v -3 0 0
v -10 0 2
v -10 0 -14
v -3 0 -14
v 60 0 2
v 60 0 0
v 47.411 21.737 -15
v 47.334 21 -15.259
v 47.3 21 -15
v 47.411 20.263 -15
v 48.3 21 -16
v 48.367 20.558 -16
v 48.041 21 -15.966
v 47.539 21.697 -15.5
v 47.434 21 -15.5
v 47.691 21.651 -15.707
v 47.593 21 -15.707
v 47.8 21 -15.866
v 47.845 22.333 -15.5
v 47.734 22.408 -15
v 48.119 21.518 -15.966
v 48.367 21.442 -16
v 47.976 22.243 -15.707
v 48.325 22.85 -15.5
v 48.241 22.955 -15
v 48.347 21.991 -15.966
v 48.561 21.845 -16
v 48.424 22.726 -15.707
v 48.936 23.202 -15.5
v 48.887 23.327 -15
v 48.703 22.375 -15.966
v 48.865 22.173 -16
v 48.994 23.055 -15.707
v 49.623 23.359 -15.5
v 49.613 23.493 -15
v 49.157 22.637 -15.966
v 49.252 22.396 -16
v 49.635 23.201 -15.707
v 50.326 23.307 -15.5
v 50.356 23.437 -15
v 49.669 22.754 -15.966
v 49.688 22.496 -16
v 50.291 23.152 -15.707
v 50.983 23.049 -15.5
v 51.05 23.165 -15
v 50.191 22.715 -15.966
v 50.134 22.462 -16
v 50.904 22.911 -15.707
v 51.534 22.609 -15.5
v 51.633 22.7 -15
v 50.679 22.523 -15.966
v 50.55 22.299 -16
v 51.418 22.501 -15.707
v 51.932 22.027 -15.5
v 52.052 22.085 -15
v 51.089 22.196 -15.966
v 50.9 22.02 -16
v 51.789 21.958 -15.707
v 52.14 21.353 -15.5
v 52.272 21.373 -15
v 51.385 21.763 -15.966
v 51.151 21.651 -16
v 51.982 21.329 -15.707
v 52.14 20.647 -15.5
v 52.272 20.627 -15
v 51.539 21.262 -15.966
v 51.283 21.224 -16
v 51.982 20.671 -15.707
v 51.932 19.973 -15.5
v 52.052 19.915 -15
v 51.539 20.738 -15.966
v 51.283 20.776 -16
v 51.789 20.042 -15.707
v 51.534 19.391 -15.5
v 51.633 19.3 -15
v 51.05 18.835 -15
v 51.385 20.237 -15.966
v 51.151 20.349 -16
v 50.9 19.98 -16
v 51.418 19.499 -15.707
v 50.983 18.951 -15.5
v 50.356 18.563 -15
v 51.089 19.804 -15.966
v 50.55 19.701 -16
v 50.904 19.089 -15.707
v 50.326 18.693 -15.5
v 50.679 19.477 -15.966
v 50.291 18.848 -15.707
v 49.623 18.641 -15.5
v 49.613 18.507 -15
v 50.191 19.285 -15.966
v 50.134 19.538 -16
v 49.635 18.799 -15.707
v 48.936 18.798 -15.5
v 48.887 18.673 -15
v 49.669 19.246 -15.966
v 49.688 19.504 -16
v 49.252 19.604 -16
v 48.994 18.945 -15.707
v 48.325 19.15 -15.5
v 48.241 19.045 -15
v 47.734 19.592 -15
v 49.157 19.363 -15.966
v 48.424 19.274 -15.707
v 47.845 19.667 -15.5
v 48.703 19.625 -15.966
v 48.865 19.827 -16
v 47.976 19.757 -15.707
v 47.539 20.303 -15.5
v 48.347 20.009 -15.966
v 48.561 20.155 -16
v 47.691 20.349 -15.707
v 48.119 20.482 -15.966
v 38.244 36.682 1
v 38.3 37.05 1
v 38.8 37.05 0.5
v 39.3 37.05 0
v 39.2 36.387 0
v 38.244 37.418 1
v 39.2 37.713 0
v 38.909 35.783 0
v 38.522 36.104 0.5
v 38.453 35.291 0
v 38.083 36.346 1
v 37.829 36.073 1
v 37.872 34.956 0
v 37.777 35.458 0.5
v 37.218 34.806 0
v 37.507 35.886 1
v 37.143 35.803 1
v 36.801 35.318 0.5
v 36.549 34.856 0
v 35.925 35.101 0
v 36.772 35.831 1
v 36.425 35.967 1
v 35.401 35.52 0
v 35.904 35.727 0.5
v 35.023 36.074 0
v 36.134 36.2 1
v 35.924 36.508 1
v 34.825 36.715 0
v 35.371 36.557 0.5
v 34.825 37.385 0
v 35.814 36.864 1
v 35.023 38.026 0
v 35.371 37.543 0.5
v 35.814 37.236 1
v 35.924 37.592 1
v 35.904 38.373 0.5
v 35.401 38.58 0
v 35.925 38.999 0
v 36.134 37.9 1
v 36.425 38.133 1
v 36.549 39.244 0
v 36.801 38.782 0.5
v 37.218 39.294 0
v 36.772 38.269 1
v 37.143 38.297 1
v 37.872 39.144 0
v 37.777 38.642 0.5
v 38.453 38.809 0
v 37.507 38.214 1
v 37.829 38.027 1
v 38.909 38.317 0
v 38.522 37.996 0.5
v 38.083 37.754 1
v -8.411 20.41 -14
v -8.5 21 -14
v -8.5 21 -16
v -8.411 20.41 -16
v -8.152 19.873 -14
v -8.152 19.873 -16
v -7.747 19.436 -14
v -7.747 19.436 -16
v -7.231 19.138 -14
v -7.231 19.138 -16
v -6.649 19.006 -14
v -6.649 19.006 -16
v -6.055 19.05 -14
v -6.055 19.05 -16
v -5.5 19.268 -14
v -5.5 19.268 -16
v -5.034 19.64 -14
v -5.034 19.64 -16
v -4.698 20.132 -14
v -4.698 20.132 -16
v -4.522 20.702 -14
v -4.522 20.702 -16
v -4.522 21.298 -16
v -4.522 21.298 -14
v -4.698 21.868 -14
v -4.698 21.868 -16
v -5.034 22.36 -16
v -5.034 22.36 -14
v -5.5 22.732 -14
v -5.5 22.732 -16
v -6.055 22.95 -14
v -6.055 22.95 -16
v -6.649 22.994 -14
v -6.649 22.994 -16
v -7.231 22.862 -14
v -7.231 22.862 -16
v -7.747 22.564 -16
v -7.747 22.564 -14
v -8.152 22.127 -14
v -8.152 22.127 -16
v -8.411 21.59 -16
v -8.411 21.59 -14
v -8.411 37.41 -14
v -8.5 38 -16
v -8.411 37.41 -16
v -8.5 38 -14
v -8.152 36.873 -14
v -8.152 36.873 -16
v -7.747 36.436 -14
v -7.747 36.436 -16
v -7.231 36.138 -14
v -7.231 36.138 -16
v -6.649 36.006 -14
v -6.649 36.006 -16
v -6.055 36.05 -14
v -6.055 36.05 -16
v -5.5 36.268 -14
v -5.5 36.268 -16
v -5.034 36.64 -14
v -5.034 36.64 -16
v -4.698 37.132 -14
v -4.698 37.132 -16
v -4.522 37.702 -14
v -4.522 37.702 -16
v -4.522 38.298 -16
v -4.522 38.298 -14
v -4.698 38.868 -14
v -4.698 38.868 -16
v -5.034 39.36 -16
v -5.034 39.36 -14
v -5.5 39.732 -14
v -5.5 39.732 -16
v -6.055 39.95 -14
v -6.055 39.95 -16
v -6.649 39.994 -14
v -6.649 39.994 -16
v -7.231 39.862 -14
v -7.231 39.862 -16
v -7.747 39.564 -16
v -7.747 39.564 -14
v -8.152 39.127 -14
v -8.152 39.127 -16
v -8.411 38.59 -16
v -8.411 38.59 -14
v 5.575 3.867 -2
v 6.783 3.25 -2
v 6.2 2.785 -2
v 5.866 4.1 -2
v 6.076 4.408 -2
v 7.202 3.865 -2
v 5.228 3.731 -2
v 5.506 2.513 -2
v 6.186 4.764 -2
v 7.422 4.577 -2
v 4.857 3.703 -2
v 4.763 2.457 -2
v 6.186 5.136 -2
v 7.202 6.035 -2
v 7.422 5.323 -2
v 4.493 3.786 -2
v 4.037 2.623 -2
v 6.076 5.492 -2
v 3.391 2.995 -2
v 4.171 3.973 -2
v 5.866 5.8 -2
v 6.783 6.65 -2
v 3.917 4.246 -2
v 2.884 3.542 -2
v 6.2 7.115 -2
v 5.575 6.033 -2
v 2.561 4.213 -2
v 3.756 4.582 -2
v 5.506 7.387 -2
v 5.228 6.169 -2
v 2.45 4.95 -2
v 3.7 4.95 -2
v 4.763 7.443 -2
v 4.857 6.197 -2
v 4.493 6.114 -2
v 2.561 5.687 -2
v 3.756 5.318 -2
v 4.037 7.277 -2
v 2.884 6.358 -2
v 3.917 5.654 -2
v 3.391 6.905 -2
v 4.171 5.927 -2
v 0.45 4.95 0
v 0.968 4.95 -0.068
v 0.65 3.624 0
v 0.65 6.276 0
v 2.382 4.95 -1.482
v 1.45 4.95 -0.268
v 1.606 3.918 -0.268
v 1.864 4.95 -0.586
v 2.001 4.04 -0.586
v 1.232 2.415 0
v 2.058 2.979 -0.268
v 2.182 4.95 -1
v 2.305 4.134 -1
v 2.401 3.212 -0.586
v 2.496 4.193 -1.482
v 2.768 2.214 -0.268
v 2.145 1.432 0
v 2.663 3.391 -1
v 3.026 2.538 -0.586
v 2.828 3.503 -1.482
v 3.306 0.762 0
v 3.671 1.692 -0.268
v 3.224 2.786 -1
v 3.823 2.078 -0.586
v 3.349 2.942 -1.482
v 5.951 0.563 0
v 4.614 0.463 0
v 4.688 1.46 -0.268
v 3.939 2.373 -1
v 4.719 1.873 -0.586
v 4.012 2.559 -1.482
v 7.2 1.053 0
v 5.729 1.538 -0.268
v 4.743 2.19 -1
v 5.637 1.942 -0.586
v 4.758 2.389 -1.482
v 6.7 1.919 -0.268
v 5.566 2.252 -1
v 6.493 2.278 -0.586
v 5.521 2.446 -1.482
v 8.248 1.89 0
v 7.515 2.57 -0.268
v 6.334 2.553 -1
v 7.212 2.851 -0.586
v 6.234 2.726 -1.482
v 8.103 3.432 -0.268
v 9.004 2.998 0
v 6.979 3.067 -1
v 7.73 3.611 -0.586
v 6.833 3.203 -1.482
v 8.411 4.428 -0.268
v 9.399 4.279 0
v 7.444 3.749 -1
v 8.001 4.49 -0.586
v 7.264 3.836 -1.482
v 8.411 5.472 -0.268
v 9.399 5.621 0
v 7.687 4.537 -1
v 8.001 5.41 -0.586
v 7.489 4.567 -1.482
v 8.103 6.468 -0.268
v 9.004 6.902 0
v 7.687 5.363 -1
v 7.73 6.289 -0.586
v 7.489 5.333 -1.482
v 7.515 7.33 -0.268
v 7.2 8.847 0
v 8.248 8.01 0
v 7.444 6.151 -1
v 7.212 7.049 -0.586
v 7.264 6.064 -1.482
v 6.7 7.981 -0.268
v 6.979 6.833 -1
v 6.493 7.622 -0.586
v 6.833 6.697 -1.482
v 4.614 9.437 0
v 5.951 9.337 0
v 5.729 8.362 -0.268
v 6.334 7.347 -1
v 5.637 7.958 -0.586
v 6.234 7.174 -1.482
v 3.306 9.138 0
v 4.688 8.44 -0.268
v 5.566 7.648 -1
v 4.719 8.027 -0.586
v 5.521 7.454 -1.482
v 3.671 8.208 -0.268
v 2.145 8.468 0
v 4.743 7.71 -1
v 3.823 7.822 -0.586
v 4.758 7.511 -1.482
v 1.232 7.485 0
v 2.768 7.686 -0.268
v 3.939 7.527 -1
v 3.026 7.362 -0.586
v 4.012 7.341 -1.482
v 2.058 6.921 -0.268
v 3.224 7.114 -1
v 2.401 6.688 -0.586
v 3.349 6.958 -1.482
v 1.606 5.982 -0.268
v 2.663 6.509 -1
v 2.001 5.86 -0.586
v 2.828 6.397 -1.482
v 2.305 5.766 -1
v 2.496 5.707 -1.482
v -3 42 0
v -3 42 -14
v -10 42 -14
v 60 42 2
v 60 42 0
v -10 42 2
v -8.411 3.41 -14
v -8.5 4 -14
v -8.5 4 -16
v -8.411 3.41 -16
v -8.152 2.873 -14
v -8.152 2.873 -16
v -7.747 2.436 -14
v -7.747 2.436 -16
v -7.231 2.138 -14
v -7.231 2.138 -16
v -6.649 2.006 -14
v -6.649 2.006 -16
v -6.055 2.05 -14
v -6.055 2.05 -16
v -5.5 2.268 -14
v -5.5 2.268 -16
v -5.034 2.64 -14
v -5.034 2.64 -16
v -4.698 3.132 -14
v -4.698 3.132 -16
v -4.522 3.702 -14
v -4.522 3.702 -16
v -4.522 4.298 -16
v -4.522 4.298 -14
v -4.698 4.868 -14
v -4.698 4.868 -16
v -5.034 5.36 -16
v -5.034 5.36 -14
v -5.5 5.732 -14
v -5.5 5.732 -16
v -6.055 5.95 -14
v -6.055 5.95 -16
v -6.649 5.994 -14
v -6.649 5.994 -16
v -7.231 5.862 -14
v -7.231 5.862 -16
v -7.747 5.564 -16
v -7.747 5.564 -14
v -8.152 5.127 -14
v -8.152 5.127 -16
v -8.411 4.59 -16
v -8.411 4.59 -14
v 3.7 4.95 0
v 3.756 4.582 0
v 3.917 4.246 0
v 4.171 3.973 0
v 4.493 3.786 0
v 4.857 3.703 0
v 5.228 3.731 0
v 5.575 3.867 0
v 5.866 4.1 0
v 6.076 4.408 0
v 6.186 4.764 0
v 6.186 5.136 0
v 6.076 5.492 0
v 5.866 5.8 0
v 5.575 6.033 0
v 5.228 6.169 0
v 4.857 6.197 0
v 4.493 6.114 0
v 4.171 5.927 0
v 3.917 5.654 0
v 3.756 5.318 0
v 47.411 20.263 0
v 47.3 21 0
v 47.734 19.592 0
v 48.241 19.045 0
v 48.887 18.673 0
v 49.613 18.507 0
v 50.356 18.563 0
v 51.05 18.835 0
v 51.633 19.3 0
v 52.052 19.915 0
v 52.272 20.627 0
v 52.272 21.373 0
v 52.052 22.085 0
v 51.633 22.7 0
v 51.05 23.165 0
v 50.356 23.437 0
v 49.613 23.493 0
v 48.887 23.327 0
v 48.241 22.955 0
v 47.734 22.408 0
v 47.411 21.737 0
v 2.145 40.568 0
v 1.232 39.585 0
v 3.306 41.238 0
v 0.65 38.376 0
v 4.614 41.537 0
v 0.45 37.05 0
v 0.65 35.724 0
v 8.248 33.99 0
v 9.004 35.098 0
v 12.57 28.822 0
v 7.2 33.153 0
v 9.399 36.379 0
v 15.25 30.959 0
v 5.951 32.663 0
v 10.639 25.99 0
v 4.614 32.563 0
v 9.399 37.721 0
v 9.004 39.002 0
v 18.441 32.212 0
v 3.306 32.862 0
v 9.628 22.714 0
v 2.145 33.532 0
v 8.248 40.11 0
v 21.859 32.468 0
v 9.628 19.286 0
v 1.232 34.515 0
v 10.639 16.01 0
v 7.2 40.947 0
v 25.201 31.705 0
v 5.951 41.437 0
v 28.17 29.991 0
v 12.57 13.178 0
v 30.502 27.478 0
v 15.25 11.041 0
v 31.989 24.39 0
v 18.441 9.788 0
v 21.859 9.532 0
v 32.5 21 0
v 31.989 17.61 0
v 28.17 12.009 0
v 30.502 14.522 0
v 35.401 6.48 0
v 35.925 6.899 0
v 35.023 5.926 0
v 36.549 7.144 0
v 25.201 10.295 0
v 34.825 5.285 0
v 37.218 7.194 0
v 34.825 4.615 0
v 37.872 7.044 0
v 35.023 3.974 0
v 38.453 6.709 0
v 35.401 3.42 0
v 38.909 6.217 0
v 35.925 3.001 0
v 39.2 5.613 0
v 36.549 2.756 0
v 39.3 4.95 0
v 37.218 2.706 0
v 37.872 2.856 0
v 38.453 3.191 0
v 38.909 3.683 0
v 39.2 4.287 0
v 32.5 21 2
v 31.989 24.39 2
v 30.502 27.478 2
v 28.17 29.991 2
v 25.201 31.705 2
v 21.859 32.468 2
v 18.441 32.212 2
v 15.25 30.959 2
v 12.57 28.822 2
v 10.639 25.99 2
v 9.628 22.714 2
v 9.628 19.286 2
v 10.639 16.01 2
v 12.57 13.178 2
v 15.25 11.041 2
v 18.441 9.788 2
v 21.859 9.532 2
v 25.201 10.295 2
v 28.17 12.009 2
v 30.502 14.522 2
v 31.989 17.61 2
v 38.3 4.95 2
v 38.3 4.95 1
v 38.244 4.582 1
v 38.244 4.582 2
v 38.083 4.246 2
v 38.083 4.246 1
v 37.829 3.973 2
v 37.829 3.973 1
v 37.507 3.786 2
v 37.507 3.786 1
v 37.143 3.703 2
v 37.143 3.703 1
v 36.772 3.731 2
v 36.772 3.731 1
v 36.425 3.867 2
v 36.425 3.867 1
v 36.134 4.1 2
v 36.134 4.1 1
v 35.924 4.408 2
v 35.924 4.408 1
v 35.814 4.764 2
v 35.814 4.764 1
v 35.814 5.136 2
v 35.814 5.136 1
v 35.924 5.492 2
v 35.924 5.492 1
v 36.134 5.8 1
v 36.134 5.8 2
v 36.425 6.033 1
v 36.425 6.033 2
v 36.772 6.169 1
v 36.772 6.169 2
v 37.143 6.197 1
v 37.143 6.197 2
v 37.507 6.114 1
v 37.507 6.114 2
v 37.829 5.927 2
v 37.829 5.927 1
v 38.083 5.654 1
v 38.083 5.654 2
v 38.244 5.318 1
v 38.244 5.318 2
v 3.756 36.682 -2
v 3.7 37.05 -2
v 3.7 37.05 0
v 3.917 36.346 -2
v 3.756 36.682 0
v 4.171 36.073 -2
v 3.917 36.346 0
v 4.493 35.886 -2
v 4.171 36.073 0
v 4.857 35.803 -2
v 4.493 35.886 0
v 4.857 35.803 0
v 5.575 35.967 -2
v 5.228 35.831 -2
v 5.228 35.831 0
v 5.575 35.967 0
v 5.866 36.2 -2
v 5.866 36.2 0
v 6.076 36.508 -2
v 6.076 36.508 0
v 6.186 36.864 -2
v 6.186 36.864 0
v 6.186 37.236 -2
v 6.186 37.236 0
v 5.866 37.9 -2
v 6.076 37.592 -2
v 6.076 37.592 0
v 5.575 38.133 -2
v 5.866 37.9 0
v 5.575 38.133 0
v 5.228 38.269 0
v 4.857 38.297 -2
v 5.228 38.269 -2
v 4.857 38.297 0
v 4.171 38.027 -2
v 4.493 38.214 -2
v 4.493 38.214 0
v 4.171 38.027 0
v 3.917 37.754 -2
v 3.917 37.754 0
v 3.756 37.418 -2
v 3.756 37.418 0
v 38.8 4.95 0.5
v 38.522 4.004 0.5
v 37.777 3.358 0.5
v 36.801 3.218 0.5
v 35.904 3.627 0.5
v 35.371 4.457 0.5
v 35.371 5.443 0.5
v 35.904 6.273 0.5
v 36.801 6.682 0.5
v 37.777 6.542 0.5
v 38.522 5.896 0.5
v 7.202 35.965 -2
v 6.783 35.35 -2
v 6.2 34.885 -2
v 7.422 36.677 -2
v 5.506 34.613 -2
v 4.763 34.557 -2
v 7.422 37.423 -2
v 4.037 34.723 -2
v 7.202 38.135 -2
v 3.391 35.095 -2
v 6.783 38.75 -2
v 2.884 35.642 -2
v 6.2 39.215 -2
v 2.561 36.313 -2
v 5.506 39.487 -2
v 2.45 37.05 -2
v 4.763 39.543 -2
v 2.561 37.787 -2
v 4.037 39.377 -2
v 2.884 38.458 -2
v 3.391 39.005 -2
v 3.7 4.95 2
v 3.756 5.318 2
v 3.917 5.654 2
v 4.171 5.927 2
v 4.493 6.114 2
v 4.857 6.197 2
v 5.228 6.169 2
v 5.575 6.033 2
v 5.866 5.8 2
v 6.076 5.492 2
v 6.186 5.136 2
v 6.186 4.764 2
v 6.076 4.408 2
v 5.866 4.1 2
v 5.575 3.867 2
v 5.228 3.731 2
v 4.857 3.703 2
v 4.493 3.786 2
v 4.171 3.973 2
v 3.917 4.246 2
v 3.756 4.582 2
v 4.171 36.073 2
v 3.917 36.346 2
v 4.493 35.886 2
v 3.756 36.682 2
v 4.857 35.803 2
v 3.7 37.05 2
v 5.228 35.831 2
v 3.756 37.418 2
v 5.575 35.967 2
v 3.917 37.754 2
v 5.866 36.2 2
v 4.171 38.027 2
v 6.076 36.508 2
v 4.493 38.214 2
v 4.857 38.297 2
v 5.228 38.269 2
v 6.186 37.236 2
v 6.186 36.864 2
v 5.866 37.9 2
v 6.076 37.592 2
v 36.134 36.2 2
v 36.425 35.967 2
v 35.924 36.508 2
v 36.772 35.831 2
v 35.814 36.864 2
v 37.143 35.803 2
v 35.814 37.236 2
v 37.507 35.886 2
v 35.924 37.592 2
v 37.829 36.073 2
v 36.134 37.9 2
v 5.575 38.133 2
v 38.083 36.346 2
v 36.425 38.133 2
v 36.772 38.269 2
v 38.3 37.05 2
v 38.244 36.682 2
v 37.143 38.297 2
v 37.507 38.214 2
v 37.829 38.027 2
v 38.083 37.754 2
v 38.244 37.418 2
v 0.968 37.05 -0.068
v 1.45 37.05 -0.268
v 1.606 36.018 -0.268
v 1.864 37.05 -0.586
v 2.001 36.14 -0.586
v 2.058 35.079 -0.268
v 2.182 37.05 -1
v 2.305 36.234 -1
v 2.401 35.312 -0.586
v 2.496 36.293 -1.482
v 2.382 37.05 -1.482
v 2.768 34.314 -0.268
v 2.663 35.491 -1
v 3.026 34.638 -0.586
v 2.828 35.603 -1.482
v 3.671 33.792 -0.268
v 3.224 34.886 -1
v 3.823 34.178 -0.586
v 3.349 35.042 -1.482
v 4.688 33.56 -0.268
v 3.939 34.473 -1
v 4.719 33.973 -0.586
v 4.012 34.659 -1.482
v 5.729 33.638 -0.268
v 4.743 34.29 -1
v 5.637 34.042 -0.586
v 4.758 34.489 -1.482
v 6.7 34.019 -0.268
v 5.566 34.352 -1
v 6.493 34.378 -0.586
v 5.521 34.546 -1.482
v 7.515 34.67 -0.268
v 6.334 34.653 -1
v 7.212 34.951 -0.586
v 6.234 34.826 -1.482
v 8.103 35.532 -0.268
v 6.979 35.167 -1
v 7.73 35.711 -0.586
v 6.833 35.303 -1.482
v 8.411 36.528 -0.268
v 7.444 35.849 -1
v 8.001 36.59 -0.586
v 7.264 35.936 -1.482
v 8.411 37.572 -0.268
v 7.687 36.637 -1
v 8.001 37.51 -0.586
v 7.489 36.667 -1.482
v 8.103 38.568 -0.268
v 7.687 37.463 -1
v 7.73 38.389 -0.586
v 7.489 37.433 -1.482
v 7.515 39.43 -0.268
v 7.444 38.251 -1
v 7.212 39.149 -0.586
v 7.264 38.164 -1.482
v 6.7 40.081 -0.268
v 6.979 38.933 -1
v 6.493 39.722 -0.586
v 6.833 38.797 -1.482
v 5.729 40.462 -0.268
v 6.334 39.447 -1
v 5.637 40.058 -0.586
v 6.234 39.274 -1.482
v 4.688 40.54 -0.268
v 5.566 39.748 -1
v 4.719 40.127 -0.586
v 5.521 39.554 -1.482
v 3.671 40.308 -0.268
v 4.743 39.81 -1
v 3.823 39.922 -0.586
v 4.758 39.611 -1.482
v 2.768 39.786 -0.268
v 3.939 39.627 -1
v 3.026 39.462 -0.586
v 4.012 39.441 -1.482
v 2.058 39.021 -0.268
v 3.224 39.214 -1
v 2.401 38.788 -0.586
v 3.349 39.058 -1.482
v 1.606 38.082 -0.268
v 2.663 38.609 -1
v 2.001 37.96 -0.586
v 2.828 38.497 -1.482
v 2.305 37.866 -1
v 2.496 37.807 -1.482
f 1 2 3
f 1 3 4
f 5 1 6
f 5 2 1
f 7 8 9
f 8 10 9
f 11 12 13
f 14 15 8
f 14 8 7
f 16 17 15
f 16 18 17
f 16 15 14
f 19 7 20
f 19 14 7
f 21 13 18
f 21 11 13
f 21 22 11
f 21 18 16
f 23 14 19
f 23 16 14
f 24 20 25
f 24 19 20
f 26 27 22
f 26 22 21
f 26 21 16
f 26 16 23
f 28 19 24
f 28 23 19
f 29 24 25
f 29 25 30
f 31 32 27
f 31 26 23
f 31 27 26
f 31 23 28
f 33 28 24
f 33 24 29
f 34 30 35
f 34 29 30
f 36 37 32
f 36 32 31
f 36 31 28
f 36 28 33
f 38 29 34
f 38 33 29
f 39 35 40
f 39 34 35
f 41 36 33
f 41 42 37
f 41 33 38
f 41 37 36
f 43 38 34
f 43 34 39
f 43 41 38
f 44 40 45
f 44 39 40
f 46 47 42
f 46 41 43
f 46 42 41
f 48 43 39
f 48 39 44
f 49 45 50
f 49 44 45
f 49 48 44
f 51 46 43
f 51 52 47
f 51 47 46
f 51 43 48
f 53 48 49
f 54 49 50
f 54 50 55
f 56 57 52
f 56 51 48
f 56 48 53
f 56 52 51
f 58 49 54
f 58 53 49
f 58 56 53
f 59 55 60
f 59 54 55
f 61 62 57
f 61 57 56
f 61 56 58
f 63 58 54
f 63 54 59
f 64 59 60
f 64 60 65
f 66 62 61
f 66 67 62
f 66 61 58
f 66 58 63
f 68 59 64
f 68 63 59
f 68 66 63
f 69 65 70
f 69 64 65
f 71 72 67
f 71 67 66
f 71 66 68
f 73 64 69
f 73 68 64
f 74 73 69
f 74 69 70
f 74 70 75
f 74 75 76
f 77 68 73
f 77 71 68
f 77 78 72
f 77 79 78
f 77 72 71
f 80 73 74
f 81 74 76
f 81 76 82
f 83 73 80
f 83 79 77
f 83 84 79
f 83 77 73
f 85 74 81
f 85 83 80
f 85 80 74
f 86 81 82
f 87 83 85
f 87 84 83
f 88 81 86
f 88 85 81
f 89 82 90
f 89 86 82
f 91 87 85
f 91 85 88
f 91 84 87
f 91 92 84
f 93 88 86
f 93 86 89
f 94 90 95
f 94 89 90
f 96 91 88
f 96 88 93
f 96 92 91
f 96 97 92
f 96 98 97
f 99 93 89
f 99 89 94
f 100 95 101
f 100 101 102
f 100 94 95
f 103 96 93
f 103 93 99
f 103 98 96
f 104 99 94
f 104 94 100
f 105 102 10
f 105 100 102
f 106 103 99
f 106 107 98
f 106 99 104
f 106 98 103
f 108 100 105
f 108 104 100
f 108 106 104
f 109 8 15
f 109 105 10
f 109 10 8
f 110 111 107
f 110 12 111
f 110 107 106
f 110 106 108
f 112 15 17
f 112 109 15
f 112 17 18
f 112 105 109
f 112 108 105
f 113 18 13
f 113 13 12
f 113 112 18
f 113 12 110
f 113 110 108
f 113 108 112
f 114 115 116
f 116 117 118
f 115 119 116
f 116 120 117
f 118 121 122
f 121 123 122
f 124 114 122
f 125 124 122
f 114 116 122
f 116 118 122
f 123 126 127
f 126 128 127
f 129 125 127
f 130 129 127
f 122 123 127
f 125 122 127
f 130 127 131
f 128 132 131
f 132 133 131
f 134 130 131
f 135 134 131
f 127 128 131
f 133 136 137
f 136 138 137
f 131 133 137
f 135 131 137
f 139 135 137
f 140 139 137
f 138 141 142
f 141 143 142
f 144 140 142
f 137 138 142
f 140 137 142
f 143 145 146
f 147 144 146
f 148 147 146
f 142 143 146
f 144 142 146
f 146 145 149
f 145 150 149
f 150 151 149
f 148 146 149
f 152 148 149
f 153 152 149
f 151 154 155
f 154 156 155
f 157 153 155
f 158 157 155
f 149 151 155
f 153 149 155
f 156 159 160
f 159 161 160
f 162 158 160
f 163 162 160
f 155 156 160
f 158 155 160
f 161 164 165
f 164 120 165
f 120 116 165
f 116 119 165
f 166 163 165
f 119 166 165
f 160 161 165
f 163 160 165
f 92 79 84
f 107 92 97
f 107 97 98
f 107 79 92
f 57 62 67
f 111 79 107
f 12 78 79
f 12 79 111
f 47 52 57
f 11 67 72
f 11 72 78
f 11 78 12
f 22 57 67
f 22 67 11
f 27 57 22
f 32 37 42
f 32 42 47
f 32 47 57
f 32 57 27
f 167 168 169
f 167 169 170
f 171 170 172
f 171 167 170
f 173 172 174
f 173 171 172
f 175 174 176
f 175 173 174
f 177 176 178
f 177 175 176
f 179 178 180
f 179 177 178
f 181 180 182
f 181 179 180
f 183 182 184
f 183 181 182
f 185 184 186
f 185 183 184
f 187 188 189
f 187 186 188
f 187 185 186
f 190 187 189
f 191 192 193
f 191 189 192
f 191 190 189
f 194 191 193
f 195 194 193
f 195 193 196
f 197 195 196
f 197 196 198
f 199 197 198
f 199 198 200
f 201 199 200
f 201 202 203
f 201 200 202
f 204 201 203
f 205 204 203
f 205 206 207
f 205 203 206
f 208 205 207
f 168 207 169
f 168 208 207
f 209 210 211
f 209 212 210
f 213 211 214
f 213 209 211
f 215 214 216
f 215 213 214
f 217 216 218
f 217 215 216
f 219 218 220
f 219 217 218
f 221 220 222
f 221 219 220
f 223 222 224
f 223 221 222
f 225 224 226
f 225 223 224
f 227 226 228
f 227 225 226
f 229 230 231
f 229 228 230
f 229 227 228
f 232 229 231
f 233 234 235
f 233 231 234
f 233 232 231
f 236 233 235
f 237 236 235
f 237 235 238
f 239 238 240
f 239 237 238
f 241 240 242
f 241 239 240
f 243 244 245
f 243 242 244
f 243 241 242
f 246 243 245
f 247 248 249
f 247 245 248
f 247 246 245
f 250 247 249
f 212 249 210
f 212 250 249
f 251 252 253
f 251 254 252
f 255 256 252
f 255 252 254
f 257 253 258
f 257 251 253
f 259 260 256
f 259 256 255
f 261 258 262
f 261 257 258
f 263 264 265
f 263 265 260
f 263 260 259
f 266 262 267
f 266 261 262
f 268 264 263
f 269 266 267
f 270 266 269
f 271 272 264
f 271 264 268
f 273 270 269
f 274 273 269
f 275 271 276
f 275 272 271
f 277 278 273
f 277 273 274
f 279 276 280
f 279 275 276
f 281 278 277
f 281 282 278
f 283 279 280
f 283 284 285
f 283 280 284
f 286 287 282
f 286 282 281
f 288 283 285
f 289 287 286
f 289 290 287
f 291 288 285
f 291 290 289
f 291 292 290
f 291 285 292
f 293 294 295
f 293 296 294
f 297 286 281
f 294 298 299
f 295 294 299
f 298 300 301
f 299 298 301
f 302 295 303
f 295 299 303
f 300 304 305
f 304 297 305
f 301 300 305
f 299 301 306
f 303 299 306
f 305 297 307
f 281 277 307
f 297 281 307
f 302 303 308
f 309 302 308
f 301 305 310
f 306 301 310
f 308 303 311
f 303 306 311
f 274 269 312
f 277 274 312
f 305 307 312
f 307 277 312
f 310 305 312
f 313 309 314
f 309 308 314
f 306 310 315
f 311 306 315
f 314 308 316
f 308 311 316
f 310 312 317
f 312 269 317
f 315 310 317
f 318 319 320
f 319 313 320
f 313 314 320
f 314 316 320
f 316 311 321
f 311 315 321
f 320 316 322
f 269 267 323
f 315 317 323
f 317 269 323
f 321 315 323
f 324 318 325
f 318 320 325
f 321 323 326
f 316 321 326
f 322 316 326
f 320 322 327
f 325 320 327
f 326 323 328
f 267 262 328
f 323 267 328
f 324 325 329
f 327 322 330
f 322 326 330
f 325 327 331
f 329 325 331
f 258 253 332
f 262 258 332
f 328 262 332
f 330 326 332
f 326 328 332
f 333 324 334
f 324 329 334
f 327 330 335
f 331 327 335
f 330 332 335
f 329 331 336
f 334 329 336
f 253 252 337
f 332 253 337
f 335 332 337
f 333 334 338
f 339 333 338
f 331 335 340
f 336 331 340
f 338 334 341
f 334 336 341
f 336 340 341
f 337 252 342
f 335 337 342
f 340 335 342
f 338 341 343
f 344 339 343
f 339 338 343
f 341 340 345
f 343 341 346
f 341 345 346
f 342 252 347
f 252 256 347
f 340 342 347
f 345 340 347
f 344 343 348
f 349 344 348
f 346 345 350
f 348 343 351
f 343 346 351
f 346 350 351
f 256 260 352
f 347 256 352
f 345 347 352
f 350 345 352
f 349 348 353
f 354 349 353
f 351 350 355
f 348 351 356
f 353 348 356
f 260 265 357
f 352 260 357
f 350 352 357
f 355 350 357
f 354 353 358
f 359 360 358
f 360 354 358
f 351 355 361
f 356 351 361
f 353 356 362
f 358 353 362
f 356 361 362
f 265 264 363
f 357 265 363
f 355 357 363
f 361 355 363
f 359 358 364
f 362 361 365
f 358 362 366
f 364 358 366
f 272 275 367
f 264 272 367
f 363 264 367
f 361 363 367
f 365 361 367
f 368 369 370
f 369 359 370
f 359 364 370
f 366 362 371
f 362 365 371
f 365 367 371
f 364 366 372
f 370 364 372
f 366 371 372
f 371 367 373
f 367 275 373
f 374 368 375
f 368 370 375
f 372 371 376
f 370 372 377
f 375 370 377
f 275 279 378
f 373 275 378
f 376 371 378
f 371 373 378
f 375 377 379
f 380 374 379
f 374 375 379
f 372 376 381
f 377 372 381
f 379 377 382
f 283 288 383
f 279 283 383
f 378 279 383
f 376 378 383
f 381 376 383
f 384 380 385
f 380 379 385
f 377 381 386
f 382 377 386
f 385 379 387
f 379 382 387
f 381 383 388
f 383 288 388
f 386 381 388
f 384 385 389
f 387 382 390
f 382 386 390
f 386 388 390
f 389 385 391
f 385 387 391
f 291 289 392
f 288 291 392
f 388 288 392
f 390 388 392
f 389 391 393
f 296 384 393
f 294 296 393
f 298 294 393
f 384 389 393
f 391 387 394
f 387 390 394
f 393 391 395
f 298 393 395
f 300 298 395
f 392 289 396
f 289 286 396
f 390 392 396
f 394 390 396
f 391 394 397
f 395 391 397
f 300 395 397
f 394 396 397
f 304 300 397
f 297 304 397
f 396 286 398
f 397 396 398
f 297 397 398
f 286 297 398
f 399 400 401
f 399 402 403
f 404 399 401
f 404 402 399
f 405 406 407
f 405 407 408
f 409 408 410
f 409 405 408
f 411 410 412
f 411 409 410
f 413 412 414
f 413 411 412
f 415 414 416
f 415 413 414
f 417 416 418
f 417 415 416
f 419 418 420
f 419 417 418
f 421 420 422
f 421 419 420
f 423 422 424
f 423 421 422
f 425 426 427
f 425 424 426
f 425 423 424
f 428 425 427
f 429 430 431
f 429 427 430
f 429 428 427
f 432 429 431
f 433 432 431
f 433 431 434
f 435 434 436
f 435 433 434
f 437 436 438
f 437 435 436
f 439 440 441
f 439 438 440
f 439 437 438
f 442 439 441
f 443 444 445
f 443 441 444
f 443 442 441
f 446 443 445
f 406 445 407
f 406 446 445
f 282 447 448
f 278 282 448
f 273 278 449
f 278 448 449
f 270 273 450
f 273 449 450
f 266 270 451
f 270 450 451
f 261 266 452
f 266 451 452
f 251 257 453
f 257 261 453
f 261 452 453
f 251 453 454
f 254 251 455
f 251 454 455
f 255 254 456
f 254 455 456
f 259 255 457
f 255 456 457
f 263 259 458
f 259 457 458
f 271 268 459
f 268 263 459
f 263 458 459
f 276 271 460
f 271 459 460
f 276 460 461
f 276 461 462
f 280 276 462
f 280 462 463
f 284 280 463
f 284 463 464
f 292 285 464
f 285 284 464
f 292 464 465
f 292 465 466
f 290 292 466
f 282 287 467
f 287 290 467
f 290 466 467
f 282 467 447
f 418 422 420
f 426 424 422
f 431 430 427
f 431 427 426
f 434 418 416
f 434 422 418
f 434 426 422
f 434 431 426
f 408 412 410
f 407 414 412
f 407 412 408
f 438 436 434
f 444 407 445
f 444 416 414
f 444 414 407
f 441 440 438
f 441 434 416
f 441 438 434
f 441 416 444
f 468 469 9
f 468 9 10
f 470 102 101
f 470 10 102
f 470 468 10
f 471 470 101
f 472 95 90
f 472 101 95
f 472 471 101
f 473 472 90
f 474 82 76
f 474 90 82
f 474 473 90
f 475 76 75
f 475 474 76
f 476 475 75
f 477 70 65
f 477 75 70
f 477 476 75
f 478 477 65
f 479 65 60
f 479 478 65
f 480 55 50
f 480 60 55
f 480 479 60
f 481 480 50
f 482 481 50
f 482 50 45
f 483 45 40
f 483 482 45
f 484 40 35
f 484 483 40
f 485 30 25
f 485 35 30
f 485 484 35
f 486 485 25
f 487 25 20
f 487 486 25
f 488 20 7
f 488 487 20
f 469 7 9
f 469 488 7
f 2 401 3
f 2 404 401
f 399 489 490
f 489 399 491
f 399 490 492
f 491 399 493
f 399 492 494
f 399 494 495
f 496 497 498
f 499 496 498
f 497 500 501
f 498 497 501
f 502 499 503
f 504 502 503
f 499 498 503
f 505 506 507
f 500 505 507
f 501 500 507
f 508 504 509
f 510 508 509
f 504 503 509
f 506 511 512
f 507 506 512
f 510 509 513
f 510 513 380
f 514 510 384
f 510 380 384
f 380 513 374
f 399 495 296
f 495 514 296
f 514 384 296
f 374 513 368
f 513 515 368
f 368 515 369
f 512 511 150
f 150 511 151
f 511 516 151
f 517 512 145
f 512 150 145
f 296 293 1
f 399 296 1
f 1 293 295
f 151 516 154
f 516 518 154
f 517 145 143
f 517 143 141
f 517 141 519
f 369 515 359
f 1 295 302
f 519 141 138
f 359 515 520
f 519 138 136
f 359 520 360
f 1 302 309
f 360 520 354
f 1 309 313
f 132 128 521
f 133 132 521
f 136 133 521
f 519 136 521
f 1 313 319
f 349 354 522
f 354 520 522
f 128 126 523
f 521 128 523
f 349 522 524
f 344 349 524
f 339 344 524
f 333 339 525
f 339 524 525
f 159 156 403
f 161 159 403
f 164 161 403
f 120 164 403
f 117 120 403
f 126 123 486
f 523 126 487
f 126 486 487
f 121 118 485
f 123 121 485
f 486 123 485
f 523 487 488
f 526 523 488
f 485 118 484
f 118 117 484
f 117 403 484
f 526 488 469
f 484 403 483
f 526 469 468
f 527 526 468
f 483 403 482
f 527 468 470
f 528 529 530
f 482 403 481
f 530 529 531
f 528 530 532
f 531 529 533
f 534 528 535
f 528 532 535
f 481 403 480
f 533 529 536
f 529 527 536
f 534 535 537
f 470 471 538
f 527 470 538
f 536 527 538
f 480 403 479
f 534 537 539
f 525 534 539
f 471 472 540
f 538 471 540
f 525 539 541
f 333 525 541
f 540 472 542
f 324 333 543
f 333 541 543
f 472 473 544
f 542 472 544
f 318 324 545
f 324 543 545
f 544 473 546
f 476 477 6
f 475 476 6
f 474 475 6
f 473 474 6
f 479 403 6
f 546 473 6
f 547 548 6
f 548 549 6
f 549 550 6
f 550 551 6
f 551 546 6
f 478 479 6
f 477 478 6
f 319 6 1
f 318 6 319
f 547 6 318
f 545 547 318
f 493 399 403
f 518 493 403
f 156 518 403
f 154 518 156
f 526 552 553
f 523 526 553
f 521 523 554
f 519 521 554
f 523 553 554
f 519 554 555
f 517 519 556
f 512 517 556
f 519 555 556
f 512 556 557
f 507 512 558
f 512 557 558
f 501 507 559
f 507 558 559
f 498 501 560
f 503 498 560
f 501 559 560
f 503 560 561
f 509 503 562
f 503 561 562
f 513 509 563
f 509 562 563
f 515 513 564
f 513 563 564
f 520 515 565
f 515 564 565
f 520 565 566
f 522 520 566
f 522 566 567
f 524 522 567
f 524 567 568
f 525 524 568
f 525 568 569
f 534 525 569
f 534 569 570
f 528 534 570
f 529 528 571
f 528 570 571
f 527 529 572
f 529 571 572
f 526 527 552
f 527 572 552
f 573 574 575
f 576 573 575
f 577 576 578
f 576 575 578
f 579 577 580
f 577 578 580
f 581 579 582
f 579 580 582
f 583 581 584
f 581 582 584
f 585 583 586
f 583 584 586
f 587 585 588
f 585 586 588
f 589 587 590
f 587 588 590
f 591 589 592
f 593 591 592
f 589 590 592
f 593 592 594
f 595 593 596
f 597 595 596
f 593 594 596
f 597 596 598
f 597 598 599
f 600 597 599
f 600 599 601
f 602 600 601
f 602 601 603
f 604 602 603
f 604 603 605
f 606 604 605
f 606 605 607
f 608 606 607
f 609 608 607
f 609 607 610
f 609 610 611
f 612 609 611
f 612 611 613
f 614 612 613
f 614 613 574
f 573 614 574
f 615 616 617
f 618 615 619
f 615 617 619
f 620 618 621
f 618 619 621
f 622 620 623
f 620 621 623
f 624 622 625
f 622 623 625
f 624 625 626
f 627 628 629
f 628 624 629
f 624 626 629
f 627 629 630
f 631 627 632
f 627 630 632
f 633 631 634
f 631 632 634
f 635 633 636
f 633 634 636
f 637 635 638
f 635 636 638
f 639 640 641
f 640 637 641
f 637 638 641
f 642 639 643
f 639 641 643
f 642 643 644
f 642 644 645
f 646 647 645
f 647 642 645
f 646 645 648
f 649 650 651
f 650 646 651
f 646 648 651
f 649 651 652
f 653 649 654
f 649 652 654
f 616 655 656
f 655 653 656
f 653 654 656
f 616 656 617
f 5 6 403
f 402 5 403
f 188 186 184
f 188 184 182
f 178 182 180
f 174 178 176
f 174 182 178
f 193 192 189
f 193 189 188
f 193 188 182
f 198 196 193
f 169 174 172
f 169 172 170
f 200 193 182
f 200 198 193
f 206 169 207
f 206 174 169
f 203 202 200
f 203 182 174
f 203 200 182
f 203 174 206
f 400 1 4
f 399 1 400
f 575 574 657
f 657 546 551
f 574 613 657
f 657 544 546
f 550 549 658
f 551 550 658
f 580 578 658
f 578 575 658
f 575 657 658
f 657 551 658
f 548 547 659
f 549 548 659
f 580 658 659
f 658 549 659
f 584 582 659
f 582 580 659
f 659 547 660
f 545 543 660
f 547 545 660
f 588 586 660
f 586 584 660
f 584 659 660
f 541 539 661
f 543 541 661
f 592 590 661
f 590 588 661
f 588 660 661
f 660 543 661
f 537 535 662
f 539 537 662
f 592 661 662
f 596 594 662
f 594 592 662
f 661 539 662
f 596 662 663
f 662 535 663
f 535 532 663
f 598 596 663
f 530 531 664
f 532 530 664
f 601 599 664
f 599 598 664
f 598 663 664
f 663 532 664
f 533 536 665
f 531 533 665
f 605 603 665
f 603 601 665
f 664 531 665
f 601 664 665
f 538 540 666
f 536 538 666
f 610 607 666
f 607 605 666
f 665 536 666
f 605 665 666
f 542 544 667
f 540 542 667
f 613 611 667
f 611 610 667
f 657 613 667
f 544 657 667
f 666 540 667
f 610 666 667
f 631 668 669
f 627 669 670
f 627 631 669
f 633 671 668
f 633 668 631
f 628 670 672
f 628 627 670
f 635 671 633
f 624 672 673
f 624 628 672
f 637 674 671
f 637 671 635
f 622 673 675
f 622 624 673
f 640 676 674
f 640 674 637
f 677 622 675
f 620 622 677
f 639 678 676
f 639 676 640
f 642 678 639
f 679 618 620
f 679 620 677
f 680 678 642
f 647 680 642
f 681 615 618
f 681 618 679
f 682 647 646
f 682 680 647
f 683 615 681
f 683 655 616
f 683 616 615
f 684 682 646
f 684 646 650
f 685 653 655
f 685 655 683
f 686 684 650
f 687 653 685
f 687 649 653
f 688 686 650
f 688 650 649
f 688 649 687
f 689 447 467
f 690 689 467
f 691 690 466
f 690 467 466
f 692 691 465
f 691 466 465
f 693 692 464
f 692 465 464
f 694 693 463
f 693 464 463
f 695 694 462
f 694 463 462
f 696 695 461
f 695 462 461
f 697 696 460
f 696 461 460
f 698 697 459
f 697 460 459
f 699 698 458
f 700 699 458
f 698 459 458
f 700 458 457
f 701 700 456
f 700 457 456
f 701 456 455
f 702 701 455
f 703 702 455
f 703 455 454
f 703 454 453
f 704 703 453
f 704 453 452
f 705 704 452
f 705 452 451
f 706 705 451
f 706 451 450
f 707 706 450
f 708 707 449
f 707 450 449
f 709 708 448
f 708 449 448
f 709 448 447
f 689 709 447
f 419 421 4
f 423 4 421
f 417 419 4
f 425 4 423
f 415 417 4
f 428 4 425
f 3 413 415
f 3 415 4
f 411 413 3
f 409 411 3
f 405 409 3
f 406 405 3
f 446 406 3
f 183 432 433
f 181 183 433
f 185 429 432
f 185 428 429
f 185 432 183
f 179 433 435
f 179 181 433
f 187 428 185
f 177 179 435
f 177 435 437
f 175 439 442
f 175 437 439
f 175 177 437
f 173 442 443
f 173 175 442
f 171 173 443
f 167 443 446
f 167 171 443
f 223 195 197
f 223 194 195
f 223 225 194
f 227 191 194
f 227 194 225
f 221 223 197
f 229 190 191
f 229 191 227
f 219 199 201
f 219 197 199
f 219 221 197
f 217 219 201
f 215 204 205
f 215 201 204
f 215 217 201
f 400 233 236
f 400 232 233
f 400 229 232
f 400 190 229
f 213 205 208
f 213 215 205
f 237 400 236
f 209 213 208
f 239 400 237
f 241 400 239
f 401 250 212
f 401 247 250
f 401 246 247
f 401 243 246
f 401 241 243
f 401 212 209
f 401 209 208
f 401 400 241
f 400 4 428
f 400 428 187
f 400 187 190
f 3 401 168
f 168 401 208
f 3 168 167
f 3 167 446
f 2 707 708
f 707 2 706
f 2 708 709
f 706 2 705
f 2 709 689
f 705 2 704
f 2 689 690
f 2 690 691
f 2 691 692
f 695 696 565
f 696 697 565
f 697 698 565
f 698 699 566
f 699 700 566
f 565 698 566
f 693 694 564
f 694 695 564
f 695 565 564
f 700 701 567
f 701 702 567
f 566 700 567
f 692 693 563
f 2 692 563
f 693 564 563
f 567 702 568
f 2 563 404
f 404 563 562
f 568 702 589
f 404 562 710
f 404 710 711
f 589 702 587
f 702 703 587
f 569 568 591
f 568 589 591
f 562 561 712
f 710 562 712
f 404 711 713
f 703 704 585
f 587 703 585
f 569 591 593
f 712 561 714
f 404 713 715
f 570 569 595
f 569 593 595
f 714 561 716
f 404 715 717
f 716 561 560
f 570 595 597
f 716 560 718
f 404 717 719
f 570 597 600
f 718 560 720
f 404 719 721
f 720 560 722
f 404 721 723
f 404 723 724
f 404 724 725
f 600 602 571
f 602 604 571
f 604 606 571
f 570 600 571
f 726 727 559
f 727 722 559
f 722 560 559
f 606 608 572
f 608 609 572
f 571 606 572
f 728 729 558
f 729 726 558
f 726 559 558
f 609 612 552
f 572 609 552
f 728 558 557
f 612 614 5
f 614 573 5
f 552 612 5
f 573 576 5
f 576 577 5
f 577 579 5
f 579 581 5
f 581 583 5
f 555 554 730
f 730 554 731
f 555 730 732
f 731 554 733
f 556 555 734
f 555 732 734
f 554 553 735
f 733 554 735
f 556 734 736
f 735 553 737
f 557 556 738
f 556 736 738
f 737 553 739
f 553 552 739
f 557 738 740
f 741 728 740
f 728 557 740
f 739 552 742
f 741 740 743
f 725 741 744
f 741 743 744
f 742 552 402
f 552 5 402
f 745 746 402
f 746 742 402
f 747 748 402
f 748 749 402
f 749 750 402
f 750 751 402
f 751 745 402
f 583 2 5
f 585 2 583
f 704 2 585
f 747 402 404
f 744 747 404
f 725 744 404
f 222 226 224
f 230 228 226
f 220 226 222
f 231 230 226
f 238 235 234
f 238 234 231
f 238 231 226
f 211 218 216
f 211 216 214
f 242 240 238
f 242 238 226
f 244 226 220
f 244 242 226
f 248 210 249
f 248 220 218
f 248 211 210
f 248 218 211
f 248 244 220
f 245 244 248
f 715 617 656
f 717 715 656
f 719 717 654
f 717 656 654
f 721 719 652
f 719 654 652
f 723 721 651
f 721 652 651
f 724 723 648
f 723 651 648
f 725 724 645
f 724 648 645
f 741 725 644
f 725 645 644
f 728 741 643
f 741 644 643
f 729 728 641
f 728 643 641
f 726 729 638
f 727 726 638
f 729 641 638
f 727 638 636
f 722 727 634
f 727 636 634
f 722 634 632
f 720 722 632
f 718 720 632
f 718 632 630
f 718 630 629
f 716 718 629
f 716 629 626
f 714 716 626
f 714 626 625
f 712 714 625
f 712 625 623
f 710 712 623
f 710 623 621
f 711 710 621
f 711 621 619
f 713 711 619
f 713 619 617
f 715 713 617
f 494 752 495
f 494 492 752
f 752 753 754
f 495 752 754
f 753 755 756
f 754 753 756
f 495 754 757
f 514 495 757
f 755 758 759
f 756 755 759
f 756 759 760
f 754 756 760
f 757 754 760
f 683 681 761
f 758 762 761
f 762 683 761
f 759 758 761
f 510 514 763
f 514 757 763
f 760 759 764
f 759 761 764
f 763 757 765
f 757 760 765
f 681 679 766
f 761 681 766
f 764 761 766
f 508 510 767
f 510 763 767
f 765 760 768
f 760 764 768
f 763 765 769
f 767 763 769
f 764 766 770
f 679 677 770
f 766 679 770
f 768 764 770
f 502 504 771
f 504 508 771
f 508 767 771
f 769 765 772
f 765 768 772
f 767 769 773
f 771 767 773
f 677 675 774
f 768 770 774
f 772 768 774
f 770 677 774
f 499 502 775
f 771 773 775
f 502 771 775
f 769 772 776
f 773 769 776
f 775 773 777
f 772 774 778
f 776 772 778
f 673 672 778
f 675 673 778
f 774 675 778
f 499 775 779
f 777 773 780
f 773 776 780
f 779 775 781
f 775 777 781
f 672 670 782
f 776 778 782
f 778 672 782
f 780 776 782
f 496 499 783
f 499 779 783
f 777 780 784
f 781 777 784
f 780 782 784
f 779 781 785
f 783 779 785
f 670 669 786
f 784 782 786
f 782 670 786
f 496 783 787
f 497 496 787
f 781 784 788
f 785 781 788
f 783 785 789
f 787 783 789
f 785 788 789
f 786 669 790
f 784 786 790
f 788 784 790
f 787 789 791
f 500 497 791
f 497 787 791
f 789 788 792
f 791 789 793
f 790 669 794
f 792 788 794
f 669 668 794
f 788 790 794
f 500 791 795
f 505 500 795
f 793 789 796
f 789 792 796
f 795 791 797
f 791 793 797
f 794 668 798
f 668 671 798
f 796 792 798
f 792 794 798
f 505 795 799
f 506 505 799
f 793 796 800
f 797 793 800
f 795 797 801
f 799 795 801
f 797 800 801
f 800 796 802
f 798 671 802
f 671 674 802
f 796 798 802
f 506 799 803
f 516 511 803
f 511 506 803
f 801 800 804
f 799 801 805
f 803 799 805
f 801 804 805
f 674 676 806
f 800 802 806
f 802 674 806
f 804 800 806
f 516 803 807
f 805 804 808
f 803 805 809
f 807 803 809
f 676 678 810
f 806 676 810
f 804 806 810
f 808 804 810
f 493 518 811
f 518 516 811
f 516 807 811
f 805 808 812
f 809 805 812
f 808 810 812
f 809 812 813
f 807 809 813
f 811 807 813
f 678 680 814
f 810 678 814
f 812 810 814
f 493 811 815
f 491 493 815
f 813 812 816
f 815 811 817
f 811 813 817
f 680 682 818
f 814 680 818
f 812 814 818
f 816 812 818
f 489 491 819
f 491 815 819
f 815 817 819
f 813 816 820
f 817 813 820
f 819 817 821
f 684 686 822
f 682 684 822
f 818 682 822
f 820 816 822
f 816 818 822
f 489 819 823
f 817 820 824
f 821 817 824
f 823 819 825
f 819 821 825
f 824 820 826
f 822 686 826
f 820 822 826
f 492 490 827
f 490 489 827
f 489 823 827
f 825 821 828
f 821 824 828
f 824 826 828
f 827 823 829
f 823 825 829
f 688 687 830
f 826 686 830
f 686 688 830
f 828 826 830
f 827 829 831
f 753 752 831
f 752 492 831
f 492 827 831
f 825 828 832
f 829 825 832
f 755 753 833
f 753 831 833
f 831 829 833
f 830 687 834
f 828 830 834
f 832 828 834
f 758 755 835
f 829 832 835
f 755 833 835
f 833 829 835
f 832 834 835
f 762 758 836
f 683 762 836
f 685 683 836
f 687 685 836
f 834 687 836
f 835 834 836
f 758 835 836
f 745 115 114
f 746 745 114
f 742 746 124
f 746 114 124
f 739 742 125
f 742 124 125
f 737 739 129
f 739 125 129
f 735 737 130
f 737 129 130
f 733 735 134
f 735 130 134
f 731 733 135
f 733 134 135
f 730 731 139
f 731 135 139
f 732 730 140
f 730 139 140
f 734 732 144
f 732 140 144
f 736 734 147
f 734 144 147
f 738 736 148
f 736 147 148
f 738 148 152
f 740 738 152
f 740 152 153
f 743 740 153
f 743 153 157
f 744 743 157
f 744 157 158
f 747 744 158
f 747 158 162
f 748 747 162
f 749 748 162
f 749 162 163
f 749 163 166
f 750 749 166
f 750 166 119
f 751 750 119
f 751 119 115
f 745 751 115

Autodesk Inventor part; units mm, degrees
ref_plane "YZ Plane" through (0, 0, 0) normal (1, 0, 0) x (0, 1, 0)
sketch "Sketch1" plane through (0, 0, 0) normal (0, 0, 1) x (1, 0, 0)
  line L0 (0, 0) -> (60, 0)
  line L1 (60, 0) -> (60, 42)
  line L2 (60, 42) -> (0, 42)
  line L3 (0, 42) -> (0, 0)
  line L4 (0, 42) -> (0, 0)
  dimension "d0" = 60
  dimension "d1" = 42
extrude "Extrusion1" add sketch "Sketch1" along normal blind 2
sketch "Sketch2" plane through (0, 0, 2) normal (0, 0, 1) x (1, 0, 0)
  circle A0 centre (21, 21) radius 11.5
  line L0 (0, 42) -> (0, 0) projected
  line L1 (60, 42) -> (0, 42) projected
  dimension "d6" = 23
  dimension "d7" = 21
  dimension "d8" = 21
extrude "Extrusion2" cut sketch "Sketch2" against normal blind 2
sketch "Sketch3" plane through (0, 0, 0) normal (0, 0, -1) x (-1, 0, 0)
  circle A0 centre (-4.95, 4.95) radius 1.25
  line L0 (0, 0) -> (-60, 0) projected
  line L1 (0, 42) -> (0, 0) projected
  dimension "d12" = 3.7
  dimension "d13" = 2.5
  dimension "d14" = 3.7
ref_plane "Work Plane2" through (0, 21, 0) normal (0, -1, 0) x (1, 0, 0)
extrude "Extrusion3" cut sketch "Sketch3" against normal through all
mirror "Mirror1" about plane through (0, 21, 0) normal (0, -1, 0) of "Extrusion3"
ref_plane "Work Plane4" through (21, 0, 0) normal (-1, 0, 0) x (0, 0, 1)
mirror "Mirror2" about plane through (21, 0, 0) normal (-1, 0, 0) of "Extrusion3", "Mirror1"
sketch "Sketch4" plane through (0, 0, 0) normal (0, 0, -1) x (-1, 0, 0)
  circle A0 centre (-21, 21) radius 11.5 projected
  circle A1 centre (-49.8, 21) radius 2.5
  point P0 (0, 0)
  dimension "d20" = 5
  dimension "d21" = 28.8
extrude "Extrusion4" add sketch "Sketch4" along normal blind 16 contours A1
fillet "Fillet2" radius 1 1 edges at (52.3, 21, -16)
sketch "Sketch5" plane through (0, 0, 0) normal (-1, 0, 0) x (0, 0, 1)
  line L0 (0, 42) -> (0, 0) projected
  line L1 (0, 42) -> (2, 42) projected
  line L2 (0, 0) -> (2, 0)
  line L3 (2, 0) -> (2, 42)
  line L4 (2, 42) -> (0, 42)
  line L5 (0, 42) -> (0, 0)
extrude "Extrusion5" add sketch "Sketch5" along normal blind 10
sketch "Sketch6" plane through (0, 0, 0) normal (0, 0, -1) x (-1, 0, 0)
  line L0 (10, 42) -> (10, 0) projected
  line L1 (-60, 42) -> (10, 42) projected
  line L2 (10, 0) -> (3, 0)
  line L3 (3, 0) -> (3, 42)
  line L4 (3, 42) -> (10, 42)
  line L5 (10, 42) -> (10, 0)
  point P0 (0, 0)
  dimension "d32" = 7
extrude "Extrusion6" add sketch "Sketch6" along normal blind 14
sketch "Sketch7" plane through (0, 0, -14) normal (0, 0, -1) x (-1, 0, 0)
  circle A0 centre (6.5, 4) radius 2
  line L0 (3, 42) -> (3, 0) projected
  line L1 (3, 0) -> (10, 0) projected
  circle A1 centre (6.5, 21) radius 2
  circle A2 centre (6.5, 38) radius 2
  point P0 (0, 0)
  dimension "d35" = 4
  dimension "d36" = 3.5
  dimension "d37" = 4
  dimension "d40" = 17
extrude "Extrusion7" add sketch "Sketch7" along normal blind 2
chamfer "Chamfer2" distance 1 angle 45 2 edges at (35.8, 4.95, 0) (35.8, 37.05, 0)
sketch "Sketch9" plane through (0, 0, 0) normal (0, 0, -1) x (-1, 0, 0)
  circle A0 centre (-4.95, 4.95) radius 1.25 projected
  circle A1 centre (-4.95, 37.05) radius 1.25 projected
  circle A2 centre (-4.95, 4.95) radius 2.5
  circle A3 centre (-4.95, 37.05) radius 2.5
  point P0 (0, 0)
  dimension "d50" = 5
  dimension "d51" = 5
extrude "Extrusion8" add sketch "Sketch9" along normal blind 2
fillet "Fillet3" radius 2 2 edges at (7.45, 4.95, 0) (7.45, 37.05, 0)
properties part number "MotorKuggHolder"
